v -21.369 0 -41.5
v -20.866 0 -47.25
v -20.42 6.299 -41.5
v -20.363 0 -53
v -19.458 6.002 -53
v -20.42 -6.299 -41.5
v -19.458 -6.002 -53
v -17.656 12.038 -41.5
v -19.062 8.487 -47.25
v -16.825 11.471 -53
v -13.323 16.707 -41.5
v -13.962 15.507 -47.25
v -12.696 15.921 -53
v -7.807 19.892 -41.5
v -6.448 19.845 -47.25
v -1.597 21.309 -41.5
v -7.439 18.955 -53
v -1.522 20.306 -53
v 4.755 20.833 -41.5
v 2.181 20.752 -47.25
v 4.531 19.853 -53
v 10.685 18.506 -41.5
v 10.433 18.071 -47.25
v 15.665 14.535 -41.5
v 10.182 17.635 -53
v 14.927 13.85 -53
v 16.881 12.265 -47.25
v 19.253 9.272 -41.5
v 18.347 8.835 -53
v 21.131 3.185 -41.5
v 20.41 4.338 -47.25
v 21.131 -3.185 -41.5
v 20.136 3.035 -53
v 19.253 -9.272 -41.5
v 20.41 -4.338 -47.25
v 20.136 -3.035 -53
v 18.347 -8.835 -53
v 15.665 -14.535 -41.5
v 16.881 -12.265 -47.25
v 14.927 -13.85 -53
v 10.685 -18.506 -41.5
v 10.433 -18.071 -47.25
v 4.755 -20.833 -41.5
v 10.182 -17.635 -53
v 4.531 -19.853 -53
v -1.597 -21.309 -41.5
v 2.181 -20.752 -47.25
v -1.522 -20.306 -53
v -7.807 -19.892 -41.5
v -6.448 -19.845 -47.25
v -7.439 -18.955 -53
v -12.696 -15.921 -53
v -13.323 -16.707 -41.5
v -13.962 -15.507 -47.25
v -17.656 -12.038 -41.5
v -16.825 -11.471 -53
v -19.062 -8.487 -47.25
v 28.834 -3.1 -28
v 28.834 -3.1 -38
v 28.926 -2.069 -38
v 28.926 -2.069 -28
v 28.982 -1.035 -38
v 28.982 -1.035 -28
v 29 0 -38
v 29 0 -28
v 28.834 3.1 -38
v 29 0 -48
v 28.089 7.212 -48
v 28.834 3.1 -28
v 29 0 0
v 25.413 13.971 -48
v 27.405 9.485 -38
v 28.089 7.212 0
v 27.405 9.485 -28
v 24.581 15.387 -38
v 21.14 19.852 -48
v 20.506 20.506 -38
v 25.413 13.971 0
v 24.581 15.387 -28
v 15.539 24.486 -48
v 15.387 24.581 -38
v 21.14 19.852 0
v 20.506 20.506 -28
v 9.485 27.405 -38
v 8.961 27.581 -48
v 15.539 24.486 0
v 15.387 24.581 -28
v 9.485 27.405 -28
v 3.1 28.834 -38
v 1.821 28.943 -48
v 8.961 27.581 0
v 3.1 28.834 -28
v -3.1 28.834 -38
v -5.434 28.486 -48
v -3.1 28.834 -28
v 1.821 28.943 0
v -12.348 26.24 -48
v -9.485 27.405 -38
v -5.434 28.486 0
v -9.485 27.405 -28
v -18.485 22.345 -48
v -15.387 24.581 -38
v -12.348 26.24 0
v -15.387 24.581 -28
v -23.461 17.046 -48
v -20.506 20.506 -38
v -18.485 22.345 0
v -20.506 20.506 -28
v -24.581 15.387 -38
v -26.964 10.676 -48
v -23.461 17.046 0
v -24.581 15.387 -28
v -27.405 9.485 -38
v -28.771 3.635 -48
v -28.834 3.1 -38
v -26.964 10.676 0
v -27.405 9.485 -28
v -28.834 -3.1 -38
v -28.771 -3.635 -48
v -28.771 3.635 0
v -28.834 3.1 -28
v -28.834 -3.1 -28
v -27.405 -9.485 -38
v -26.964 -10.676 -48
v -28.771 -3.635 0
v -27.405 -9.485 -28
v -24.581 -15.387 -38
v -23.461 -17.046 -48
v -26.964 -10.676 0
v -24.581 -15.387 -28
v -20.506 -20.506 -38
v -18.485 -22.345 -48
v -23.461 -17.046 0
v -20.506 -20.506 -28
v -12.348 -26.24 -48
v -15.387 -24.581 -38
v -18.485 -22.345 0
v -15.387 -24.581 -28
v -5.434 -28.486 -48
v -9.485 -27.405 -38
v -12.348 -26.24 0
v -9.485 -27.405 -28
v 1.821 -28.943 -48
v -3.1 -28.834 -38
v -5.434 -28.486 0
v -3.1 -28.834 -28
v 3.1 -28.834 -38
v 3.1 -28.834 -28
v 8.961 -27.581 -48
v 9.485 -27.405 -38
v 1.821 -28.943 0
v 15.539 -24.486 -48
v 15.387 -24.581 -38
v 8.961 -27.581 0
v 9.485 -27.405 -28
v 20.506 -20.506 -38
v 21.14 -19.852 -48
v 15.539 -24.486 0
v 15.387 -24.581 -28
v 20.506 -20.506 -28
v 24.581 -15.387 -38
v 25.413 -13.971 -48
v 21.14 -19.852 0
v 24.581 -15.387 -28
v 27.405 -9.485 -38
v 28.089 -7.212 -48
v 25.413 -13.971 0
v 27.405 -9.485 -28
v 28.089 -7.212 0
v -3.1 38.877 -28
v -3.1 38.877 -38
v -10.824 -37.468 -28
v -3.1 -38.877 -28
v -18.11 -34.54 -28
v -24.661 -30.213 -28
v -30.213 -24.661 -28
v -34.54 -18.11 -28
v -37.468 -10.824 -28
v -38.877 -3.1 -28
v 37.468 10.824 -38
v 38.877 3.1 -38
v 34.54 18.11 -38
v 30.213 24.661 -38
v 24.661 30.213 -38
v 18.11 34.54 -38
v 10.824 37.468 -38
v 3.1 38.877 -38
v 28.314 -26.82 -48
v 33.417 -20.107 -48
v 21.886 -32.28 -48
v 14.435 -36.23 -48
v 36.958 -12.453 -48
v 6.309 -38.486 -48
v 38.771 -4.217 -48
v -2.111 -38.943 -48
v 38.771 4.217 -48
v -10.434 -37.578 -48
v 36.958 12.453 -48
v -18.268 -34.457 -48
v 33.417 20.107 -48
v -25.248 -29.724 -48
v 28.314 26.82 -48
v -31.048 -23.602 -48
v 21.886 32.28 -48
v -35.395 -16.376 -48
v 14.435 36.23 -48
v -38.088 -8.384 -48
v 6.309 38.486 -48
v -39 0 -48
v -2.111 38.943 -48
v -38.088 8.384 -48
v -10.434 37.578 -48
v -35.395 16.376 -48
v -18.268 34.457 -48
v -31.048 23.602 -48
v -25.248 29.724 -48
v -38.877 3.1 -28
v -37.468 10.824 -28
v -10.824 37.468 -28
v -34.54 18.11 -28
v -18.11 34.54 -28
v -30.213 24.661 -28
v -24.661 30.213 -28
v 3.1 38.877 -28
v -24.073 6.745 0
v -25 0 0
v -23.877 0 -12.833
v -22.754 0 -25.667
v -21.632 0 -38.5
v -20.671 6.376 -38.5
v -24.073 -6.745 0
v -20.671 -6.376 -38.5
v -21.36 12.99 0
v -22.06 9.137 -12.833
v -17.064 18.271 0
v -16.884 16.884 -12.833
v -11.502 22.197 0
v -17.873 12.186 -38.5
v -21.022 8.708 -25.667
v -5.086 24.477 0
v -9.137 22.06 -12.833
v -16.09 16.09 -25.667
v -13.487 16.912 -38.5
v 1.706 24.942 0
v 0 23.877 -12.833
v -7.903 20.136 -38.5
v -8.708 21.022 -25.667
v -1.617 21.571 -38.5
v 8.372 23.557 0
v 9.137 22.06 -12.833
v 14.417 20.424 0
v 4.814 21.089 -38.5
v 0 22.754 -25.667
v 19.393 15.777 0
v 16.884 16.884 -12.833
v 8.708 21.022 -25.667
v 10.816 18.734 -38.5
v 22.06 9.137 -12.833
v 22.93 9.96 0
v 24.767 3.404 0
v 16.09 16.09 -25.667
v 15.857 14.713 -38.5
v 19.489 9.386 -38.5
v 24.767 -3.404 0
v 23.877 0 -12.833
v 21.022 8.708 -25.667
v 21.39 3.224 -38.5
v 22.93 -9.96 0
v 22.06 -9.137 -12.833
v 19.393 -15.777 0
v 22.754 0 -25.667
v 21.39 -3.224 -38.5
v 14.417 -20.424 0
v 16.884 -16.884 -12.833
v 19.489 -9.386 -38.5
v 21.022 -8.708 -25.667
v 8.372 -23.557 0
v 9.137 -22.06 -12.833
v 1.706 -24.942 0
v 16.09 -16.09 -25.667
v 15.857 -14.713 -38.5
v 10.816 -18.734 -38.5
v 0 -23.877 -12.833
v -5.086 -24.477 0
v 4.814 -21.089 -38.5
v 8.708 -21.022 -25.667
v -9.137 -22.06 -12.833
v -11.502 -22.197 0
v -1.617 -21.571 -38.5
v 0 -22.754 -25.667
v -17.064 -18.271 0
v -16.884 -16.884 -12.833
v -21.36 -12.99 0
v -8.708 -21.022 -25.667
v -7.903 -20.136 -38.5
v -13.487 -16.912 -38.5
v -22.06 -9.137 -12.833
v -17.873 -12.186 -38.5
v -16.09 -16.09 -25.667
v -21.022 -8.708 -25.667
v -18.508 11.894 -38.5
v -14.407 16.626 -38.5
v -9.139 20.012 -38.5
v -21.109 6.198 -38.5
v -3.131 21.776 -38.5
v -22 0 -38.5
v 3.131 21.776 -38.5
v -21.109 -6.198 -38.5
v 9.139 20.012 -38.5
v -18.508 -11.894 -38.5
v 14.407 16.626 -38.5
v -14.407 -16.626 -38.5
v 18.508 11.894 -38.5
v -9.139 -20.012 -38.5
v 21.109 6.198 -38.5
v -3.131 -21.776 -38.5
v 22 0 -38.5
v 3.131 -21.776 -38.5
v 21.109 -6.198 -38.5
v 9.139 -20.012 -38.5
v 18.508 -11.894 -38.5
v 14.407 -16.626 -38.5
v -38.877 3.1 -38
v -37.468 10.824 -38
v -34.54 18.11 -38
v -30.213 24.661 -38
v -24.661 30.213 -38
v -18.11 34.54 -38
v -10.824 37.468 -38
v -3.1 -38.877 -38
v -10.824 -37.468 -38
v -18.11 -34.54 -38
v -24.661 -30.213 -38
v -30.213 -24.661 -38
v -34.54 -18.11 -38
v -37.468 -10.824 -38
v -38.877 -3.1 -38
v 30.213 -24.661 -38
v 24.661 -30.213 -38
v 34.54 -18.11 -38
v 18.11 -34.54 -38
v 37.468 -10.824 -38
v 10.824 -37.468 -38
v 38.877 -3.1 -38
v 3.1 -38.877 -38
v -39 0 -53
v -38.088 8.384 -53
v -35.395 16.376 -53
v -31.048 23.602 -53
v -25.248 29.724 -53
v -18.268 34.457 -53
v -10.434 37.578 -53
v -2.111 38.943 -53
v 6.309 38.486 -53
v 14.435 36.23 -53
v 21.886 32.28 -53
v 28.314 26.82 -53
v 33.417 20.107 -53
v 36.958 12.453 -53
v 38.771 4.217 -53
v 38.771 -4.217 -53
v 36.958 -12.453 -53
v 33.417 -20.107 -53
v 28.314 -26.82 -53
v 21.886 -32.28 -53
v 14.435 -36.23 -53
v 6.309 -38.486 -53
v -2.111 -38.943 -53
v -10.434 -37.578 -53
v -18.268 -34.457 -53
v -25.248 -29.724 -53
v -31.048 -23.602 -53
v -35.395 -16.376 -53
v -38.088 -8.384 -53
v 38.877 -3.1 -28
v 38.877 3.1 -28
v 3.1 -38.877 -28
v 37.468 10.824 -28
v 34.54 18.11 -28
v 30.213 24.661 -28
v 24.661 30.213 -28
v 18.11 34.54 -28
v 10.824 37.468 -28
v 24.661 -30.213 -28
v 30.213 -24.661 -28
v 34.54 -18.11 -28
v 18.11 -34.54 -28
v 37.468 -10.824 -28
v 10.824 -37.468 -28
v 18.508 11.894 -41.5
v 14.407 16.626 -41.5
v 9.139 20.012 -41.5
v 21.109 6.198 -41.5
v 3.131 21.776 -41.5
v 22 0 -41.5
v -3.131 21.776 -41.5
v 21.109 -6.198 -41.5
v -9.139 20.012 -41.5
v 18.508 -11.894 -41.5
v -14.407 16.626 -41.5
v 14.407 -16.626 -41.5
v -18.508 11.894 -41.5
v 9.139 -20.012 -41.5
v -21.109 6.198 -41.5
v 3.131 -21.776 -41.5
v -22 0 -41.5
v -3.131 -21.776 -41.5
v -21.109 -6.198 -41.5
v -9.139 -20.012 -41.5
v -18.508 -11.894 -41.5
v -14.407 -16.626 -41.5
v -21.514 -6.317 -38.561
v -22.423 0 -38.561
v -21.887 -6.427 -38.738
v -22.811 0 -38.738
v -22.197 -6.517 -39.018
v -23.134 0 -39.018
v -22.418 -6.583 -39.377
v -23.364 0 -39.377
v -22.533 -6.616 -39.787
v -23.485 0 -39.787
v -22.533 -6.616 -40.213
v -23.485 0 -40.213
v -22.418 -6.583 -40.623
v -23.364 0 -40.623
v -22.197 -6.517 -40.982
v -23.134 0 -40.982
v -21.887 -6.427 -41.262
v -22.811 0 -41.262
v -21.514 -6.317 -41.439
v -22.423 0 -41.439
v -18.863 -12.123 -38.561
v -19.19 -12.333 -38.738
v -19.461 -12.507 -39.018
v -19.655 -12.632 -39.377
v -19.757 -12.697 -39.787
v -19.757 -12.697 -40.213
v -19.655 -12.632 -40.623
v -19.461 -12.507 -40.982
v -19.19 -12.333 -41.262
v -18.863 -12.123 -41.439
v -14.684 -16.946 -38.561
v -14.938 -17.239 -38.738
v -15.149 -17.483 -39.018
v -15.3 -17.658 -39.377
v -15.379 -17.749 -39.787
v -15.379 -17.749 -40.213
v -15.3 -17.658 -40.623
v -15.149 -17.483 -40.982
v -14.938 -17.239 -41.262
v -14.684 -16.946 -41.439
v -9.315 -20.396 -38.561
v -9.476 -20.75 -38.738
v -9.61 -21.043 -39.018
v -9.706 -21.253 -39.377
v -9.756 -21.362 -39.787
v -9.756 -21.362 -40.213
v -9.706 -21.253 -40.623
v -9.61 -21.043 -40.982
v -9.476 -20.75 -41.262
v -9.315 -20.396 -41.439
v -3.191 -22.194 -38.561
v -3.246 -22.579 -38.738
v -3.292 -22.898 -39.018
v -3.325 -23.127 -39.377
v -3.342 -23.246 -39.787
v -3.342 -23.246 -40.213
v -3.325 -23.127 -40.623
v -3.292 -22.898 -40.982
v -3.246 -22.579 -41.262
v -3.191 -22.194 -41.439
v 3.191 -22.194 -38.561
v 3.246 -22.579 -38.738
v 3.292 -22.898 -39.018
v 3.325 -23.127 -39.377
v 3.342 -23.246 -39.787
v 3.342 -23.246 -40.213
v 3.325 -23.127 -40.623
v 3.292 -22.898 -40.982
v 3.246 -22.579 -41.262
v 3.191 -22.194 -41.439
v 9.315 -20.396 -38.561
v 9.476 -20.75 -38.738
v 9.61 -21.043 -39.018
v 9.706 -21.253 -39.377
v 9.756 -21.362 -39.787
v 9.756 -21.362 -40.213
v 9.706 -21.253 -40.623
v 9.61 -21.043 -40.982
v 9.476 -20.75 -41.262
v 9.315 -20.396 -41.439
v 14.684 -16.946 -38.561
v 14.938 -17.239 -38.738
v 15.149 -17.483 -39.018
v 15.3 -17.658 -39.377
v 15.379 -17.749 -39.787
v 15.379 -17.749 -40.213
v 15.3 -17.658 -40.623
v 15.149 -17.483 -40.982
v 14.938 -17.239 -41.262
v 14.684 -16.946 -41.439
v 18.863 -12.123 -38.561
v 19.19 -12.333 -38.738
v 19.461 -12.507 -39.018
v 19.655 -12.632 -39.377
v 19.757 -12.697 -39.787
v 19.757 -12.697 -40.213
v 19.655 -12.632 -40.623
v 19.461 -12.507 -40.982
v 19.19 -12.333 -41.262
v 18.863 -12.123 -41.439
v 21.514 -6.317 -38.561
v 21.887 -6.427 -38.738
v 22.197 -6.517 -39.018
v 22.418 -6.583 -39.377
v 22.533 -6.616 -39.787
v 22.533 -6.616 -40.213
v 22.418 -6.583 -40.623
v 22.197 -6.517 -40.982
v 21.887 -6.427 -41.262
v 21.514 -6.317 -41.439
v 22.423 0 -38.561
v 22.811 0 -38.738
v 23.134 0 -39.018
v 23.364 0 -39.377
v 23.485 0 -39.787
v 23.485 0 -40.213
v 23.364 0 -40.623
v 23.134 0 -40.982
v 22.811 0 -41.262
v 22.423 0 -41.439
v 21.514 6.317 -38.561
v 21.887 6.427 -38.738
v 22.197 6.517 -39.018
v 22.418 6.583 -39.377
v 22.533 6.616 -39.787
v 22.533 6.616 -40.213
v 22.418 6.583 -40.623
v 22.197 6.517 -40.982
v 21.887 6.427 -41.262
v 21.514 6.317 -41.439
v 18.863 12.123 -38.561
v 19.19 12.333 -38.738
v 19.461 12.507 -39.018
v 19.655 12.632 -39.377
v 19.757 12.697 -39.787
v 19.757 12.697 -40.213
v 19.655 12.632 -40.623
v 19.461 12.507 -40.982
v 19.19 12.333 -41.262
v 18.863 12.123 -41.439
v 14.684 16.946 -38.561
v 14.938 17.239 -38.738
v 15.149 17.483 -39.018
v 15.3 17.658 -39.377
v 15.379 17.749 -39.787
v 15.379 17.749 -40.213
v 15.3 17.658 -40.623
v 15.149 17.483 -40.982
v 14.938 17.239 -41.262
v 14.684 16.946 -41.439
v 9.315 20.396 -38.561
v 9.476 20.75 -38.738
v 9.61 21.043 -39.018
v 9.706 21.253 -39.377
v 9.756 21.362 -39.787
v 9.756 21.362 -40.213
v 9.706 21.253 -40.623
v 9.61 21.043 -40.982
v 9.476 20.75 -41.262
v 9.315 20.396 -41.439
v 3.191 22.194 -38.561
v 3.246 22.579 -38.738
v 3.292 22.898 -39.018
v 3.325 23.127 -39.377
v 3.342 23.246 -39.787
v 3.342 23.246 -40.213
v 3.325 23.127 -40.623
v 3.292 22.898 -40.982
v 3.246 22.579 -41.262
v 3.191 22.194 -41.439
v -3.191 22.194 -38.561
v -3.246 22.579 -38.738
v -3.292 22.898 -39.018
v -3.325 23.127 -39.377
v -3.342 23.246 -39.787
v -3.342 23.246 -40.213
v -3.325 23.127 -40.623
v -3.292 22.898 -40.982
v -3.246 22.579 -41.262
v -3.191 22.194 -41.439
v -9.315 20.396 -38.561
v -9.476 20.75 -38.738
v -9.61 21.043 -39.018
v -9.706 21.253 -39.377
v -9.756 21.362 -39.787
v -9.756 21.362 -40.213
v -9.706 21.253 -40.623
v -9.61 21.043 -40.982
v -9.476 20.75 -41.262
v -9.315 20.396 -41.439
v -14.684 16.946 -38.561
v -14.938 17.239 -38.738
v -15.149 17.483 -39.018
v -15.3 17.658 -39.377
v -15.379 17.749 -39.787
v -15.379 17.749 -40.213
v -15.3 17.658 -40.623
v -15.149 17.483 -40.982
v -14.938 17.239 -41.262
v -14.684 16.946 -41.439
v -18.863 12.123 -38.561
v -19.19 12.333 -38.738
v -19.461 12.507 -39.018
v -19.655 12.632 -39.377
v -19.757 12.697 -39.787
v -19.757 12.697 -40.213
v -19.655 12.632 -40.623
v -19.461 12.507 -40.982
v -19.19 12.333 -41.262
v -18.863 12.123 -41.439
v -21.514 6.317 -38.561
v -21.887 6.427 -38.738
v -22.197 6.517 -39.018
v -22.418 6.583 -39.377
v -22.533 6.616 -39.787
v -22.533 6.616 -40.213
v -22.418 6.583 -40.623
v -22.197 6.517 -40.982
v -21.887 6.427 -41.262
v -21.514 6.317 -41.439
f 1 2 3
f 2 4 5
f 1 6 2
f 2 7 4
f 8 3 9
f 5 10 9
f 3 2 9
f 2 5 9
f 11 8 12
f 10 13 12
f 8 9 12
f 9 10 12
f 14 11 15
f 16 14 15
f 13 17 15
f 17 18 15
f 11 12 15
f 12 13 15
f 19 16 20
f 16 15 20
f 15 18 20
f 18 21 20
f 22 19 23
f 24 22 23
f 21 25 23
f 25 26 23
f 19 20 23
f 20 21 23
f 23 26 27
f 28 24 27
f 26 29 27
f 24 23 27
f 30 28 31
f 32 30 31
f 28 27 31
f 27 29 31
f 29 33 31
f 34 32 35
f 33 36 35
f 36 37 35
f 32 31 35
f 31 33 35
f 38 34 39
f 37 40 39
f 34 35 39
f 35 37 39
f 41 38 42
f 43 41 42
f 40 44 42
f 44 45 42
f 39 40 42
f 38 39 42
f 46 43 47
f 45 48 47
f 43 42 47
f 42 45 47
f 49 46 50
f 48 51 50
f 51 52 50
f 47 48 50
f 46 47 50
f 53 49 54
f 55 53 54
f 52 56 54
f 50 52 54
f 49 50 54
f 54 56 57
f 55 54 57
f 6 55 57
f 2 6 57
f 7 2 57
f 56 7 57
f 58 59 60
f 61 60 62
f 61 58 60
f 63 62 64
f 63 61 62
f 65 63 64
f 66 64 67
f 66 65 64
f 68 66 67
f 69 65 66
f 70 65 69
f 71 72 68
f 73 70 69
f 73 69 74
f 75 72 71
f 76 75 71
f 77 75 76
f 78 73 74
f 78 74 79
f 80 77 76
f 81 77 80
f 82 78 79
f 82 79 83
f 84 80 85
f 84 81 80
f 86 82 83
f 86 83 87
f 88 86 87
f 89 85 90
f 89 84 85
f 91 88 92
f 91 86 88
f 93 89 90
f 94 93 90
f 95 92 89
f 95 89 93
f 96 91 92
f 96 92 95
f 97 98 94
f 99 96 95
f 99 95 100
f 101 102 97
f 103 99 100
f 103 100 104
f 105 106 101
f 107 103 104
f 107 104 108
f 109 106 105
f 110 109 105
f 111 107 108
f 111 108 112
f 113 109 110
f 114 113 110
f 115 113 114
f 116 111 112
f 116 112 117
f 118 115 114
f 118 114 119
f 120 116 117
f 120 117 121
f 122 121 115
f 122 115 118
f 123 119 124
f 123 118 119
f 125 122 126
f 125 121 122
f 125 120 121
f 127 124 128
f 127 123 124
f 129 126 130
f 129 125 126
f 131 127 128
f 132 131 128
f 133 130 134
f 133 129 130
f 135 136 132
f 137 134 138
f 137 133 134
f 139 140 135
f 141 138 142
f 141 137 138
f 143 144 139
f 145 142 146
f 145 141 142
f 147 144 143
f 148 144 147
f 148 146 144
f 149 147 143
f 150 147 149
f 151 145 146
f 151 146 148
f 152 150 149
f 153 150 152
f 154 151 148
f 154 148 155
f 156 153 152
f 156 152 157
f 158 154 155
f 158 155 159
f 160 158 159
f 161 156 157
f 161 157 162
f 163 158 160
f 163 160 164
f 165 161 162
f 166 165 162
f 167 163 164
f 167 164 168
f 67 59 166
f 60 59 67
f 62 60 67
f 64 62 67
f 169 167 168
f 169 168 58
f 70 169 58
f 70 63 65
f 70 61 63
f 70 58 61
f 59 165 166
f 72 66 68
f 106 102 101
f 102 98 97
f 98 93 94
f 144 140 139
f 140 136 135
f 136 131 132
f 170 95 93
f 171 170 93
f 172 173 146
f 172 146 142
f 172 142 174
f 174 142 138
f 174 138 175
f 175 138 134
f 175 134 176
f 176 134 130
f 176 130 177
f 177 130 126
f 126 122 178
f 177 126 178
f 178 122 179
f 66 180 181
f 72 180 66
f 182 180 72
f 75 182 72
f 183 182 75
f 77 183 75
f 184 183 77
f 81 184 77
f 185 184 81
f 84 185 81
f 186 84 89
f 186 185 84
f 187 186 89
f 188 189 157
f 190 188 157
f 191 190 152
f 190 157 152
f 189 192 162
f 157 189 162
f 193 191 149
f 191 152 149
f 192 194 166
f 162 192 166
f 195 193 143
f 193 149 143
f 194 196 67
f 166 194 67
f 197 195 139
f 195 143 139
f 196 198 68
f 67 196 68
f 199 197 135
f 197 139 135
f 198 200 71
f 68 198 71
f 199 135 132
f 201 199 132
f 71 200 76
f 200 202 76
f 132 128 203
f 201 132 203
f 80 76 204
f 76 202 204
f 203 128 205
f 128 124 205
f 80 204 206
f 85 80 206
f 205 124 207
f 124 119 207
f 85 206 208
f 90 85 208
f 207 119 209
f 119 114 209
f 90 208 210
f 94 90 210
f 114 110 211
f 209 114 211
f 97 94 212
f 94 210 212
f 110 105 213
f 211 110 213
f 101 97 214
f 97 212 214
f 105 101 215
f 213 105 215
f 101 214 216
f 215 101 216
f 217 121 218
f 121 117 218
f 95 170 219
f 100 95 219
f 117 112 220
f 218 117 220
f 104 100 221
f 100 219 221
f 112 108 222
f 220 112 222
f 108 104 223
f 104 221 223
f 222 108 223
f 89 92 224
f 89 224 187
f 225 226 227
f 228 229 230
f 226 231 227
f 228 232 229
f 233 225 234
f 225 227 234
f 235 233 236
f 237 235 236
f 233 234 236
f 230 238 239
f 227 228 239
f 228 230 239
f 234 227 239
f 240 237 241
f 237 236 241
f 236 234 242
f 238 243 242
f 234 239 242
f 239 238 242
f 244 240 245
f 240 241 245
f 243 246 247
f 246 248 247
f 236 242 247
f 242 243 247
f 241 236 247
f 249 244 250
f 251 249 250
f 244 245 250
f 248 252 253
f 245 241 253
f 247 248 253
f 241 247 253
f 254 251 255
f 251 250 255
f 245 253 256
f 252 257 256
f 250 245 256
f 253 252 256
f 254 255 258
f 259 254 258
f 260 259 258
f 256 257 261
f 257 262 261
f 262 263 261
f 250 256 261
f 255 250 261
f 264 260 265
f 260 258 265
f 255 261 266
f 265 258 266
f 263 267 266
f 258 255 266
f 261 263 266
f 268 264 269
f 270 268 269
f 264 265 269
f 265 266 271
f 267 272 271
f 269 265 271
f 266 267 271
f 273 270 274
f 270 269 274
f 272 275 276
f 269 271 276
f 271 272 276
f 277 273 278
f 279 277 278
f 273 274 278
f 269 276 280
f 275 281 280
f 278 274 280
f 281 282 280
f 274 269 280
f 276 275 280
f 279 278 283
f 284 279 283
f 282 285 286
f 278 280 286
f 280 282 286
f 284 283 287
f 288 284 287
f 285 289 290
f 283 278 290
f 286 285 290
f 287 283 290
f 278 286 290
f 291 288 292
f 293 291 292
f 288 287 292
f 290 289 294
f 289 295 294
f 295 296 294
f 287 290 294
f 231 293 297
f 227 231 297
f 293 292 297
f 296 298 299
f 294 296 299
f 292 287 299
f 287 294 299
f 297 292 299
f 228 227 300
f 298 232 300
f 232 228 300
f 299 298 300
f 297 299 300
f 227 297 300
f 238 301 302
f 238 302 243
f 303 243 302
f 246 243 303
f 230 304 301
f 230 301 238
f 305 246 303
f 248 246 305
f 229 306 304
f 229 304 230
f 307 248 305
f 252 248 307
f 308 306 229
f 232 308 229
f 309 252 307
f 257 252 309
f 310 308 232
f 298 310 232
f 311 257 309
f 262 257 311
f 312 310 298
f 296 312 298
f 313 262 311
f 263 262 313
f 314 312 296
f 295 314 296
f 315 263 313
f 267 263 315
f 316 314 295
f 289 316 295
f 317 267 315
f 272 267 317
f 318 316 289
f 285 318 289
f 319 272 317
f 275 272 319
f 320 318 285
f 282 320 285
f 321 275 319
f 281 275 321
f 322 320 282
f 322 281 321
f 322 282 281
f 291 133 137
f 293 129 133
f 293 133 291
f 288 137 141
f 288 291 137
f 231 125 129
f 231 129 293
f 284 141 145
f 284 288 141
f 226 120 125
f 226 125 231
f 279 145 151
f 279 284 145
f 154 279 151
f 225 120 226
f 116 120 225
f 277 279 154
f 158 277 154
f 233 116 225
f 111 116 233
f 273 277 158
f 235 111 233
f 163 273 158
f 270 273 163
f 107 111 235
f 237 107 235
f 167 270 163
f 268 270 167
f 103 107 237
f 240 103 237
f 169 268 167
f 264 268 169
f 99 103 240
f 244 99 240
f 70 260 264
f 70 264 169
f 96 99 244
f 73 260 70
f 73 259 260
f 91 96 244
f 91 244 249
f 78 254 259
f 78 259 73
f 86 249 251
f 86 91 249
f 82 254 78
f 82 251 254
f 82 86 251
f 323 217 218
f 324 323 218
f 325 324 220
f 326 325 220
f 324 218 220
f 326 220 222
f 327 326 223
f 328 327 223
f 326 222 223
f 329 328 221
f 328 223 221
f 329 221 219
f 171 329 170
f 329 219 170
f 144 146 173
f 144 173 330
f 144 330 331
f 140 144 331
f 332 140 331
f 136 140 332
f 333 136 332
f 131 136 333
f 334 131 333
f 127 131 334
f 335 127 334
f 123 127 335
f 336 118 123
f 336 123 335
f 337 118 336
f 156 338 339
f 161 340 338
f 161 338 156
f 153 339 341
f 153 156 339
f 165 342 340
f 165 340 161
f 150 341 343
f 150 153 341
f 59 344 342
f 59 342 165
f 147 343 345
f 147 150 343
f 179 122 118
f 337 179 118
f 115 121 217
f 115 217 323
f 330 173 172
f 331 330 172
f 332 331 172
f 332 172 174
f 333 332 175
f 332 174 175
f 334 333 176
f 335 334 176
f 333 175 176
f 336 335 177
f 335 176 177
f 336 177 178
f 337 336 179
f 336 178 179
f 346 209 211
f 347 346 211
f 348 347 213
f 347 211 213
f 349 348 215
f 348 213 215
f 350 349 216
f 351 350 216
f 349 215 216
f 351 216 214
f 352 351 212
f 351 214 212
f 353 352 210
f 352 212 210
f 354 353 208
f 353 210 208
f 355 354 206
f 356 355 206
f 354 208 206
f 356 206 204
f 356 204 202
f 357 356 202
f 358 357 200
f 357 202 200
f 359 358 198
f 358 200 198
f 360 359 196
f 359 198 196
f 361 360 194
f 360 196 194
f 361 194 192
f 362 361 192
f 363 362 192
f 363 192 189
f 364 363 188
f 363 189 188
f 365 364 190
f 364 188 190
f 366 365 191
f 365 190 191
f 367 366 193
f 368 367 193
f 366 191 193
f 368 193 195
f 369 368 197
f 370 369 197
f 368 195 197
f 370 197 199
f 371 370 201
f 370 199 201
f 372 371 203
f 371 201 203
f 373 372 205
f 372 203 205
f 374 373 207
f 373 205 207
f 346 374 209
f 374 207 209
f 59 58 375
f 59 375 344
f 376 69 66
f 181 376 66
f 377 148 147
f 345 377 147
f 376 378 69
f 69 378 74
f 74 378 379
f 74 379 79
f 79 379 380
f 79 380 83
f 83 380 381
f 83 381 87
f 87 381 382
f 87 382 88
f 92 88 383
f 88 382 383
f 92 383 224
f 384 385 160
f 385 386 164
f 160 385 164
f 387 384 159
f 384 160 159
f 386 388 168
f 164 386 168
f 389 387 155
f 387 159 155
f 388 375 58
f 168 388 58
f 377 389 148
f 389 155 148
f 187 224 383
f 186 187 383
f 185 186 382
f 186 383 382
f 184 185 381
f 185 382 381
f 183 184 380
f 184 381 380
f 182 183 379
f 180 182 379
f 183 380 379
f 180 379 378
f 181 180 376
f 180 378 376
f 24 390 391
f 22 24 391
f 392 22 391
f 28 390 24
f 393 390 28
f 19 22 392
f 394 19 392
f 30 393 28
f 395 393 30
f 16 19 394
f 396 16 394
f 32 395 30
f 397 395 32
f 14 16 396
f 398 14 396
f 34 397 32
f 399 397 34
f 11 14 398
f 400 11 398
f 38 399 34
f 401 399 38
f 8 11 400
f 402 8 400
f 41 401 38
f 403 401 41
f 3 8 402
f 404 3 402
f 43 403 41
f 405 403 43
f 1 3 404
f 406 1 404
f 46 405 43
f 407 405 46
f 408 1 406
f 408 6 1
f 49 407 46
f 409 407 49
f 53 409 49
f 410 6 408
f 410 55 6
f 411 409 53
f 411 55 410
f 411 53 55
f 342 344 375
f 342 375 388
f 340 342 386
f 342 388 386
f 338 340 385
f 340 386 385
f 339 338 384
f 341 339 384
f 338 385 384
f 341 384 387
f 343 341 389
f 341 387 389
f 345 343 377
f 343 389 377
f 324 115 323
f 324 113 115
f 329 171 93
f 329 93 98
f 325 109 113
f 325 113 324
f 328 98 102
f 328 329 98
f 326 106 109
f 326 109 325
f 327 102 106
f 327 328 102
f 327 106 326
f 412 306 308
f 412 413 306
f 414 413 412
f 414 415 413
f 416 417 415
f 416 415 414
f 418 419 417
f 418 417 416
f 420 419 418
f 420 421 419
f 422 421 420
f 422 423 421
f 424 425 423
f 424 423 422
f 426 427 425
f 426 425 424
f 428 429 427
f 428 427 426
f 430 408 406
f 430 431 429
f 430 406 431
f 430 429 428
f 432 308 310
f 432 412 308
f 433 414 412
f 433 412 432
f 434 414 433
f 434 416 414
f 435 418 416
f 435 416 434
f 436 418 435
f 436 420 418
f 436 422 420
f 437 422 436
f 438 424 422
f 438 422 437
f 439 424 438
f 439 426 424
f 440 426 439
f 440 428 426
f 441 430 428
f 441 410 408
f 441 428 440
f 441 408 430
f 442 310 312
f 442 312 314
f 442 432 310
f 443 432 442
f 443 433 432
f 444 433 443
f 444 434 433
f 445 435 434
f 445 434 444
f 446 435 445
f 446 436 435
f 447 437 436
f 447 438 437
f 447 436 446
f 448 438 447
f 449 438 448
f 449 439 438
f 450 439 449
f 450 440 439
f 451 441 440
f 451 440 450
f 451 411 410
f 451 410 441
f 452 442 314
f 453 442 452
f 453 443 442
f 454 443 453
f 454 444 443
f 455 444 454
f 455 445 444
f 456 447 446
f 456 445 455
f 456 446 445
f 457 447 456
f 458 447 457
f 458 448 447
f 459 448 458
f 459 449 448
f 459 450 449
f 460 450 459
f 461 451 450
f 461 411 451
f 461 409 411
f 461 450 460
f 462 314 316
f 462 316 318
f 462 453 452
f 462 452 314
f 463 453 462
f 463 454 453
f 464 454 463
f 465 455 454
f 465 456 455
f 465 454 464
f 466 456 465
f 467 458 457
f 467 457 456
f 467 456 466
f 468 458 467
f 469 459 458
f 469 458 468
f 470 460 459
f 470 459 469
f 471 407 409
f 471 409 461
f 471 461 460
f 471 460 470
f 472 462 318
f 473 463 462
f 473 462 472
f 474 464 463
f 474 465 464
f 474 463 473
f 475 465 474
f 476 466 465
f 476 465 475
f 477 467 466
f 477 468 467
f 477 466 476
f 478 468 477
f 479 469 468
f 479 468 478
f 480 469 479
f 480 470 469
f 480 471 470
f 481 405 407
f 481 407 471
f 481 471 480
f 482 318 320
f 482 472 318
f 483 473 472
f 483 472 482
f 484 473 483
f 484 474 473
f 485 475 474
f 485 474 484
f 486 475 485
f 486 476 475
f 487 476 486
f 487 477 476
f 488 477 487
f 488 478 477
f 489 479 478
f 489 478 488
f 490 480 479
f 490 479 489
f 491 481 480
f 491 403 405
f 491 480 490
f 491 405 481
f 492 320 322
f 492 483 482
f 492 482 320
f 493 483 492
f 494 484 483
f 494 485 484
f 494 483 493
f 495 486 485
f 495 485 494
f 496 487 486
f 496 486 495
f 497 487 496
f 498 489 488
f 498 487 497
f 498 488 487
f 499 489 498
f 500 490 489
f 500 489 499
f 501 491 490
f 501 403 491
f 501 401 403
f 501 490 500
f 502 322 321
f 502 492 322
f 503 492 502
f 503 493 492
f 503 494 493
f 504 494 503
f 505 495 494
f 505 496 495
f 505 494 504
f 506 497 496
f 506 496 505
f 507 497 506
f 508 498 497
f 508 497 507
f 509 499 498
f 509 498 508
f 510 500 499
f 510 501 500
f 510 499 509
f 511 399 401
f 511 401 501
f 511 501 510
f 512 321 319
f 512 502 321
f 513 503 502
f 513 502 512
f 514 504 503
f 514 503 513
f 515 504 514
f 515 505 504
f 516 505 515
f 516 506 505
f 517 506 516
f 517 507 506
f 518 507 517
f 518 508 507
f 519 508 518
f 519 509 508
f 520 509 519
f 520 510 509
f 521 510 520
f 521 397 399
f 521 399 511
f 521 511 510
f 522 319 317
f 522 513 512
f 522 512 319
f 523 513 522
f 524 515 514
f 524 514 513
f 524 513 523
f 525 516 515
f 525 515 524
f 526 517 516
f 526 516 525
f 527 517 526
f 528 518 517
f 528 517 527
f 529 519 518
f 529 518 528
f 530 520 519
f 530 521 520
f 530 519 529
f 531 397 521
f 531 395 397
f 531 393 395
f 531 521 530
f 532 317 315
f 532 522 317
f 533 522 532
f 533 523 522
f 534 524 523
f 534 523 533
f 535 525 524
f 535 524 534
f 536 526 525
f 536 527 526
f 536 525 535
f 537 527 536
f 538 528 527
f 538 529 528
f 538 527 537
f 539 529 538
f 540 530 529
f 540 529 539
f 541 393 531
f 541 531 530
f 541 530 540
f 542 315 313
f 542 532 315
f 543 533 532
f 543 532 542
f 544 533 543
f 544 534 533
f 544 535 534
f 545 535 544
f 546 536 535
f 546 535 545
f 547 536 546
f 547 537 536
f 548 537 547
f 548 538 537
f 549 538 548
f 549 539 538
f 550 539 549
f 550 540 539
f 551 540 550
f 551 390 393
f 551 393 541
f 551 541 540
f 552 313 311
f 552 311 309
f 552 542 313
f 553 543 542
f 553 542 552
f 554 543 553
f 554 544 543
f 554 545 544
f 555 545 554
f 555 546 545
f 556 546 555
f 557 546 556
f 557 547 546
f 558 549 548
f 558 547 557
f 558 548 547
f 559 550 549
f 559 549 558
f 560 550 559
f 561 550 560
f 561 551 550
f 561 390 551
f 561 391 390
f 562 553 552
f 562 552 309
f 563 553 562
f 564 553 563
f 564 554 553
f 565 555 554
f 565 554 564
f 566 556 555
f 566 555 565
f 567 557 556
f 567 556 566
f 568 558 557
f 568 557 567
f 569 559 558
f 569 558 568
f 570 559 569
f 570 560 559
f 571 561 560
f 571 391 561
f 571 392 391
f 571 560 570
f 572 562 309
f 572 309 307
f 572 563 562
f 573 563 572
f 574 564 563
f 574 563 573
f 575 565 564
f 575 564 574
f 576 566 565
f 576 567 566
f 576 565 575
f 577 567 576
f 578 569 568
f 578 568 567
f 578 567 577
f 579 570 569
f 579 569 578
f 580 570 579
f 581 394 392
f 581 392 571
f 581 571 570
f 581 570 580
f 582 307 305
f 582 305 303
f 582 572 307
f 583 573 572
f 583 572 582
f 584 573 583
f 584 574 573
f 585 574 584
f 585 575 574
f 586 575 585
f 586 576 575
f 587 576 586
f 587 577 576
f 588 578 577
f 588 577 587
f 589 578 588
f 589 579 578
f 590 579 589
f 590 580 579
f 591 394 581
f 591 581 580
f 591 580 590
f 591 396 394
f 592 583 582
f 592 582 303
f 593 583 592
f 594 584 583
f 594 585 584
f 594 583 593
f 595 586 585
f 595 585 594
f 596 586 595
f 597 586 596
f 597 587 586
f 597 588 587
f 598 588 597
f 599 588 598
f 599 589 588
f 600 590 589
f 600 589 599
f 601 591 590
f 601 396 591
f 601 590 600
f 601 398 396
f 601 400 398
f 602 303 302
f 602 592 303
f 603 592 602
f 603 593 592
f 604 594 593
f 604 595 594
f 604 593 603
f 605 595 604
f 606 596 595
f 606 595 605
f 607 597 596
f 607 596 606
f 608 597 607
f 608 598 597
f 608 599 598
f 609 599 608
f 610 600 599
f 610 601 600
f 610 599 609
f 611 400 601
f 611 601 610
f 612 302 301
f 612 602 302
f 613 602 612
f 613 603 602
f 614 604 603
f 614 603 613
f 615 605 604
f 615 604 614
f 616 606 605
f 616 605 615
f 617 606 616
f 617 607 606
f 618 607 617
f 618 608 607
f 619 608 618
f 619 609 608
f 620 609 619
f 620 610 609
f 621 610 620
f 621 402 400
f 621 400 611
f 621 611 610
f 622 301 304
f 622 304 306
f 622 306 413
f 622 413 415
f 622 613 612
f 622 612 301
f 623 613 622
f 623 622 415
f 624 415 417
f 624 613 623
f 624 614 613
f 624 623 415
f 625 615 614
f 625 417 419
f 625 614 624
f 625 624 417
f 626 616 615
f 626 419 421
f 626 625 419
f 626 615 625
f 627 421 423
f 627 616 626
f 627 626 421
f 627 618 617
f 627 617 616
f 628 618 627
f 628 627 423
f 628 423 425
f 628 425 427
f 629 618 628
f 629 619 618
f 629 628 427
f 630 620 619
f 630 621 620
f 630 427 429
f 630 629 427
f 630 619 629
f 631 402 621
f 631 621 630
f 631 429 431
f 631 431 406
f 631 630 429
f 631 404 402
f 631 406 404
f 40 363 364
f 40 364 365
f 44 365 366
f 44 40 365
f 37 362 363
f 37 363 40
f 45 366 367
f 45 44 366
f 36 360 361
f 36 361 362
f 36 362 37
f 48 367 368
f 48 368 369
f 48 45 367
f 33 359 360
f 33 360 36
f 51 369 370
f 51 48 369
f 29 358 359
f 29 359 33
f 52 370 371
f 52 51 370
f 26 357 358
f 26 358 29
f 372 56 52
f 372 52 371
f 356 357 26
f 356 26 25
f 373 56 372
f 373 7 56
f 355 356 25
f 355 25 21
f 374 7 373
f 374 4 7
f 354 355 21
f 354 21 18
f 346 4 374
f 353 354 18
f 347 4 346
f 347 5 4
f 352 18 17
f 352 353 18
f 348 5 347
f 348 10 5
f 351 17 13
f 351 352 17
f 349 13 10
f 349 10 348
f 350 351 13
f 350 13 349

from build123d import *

# Parameters (mm, degrees)
SKETCH1_R                = 29
BOSS_EXTRUDE1_DEPTH      = 53
SKETCH2_R                = 25
CUT_EXTRUDE1_DEPTH       = 68.014923711
CUT_EXTRUDE1_TAPER       = 5
EXTRUDE_START            = -5
SKETCH_1_R               = 39
SKETCH_1_R_2             = 29
EXTRUDE_1_DEPTH          = 5
EXTRUDE_START_2          = -10
SKETCH_2_R               = 39
SKETCH_2_R_2             = 29
EXTRUDE_2_DEPTH          = 10
CUT_EXTRUDE_1_REACH      = 108.705
CUT_EXTRUDE_1_END_RADIUS = 29
SKETCH_3_W               = 6.2
SKETCH_3_H               = 20.212278325
PATTERN_CIRCULAR_1_COUNT = 4


with BuildPart() as part:
    # Sketch1 → Boss-Extrude1 (new body)
    with BuildSketch(Plane.XY):
        Circle(SKETCH1_R)
    extrude(amount=-BOSS_EXTRUDE1_DEPTH)

    # Sketch2 → Cut-Extrude1 (cut, through all)
    with BuildSketch(Plane(origin=(0, 0, 0), x_dir=(-1, 0, 0), z_dir=(0, 0, -1))):
        Circle(SKETCH2_R)
    extrude(amount=CUT_EXTRUDE1_DEPTH, taper=CUT_EXTRUDE1_TAPER, mode=Mode.SUBTRACT)

    # Sketch3 → Cut-Revolve1 (revolve, cut)
    with BuildSketch(Plane(origin=(0, 0, 0), x_dir=(0, 0, -1), z_dir=(1, 0, 0))):
        with BuildLine():
            Line((41.5, 22), (41.5, 20.5))
            Line((41.5, 20.5), (38.5, 20.5))
            Line((38.5, 20.5), (38.5, 22))
            ThreePointArc((38.5, 22), (40, 23.5), (41.5, 22))
        make_face()
    revolve(axis=Axis((0, 0, -33.171853518), (0, 0, 1)), mode=Mode.SUBTRACT)

    # Эскиз1 → Бобышка-Вытянуть1 (add)
    with BuildSketch(Plane(origin=(0, 0, -53), x_dir=(-1, 0, 0), z_dir=(0, 0, -1)).offset(EXTRUDE_START)):
        Circle(SKETCH_1_R)
        Circle(SKETCH_1_R_2, mode=Mode.SUBTRACT)
    extrude(amount=EXTRUDE_1_DEPTH)

    # Эскиз2 → Бобышка-Вытянуть2 (add)
    with BuildSketch(Plane(origin=(0, 0, -38), x_dir=(-1, 0, 0), z_dir=(0, 0, -1)).offset(EXTRUDE_START_2)):
        Circle(SKETCH_2_R)
        Circle(SKETCH_2_R_2, mode=Mode.SUBTRACT)
    extrude(amount=EXTRUDE_2_DEPTH)

    # Вырез-Вытянуть1: up to this cylinder (the profile starts outside it)
    cut_extrude_1_end = Plane(origin=(0, 0, -32.476974), z_dir=(0, 0, 1)) * Cylinder(CUT_EXTRUDE_1_END_RADIUS, 276.41, mode=Mode.PRIVATE)
    # Эскиз3 → Вырез-Вытянуть1 (cut, up to the surface)
    with BuildSketch(Plane(origin=(0, 45, 0), x_dir=(1, 0, 0), z_dir=(0, 1, 0)), mode=Mode.PRIVATE) as cut_extrude_1_sk1:
        with Locations((0, 32.47697446)):
            Rectangle(SKETCH_3_W, SKETCH_3_H)
    cut_extrude_1_tool1 = extrude(cut_extrude_1_sk1.sketch, amount=-CUT_EXTRUDE_1_REACH, mode=Mode.PRIVATE) - cut_extrude_1_end
    cut_extrude_1 = cut_extrude_1_tool1.solids().sort_by_distance((0, 45, -32.476974))[0]
    add(cut_extrude_1, mode=Mode.SUBTRACT)

    # Круговой массив1: Вырез-Вытянуть1 ×4 about axis
    pattern_circular_1_axis = Axis((0, 0, 0), (0, 0, 1))
    for i in range(1, PATTERN_CIRCULAR_1_COUNT):
        add(cut_extrude_1.rotate(pattern_circular_1_axis, i * 360 / PATTERN_CIRCULAR_1_COUNT), mode=Mode.SUBTRACT)


solid = part.part
